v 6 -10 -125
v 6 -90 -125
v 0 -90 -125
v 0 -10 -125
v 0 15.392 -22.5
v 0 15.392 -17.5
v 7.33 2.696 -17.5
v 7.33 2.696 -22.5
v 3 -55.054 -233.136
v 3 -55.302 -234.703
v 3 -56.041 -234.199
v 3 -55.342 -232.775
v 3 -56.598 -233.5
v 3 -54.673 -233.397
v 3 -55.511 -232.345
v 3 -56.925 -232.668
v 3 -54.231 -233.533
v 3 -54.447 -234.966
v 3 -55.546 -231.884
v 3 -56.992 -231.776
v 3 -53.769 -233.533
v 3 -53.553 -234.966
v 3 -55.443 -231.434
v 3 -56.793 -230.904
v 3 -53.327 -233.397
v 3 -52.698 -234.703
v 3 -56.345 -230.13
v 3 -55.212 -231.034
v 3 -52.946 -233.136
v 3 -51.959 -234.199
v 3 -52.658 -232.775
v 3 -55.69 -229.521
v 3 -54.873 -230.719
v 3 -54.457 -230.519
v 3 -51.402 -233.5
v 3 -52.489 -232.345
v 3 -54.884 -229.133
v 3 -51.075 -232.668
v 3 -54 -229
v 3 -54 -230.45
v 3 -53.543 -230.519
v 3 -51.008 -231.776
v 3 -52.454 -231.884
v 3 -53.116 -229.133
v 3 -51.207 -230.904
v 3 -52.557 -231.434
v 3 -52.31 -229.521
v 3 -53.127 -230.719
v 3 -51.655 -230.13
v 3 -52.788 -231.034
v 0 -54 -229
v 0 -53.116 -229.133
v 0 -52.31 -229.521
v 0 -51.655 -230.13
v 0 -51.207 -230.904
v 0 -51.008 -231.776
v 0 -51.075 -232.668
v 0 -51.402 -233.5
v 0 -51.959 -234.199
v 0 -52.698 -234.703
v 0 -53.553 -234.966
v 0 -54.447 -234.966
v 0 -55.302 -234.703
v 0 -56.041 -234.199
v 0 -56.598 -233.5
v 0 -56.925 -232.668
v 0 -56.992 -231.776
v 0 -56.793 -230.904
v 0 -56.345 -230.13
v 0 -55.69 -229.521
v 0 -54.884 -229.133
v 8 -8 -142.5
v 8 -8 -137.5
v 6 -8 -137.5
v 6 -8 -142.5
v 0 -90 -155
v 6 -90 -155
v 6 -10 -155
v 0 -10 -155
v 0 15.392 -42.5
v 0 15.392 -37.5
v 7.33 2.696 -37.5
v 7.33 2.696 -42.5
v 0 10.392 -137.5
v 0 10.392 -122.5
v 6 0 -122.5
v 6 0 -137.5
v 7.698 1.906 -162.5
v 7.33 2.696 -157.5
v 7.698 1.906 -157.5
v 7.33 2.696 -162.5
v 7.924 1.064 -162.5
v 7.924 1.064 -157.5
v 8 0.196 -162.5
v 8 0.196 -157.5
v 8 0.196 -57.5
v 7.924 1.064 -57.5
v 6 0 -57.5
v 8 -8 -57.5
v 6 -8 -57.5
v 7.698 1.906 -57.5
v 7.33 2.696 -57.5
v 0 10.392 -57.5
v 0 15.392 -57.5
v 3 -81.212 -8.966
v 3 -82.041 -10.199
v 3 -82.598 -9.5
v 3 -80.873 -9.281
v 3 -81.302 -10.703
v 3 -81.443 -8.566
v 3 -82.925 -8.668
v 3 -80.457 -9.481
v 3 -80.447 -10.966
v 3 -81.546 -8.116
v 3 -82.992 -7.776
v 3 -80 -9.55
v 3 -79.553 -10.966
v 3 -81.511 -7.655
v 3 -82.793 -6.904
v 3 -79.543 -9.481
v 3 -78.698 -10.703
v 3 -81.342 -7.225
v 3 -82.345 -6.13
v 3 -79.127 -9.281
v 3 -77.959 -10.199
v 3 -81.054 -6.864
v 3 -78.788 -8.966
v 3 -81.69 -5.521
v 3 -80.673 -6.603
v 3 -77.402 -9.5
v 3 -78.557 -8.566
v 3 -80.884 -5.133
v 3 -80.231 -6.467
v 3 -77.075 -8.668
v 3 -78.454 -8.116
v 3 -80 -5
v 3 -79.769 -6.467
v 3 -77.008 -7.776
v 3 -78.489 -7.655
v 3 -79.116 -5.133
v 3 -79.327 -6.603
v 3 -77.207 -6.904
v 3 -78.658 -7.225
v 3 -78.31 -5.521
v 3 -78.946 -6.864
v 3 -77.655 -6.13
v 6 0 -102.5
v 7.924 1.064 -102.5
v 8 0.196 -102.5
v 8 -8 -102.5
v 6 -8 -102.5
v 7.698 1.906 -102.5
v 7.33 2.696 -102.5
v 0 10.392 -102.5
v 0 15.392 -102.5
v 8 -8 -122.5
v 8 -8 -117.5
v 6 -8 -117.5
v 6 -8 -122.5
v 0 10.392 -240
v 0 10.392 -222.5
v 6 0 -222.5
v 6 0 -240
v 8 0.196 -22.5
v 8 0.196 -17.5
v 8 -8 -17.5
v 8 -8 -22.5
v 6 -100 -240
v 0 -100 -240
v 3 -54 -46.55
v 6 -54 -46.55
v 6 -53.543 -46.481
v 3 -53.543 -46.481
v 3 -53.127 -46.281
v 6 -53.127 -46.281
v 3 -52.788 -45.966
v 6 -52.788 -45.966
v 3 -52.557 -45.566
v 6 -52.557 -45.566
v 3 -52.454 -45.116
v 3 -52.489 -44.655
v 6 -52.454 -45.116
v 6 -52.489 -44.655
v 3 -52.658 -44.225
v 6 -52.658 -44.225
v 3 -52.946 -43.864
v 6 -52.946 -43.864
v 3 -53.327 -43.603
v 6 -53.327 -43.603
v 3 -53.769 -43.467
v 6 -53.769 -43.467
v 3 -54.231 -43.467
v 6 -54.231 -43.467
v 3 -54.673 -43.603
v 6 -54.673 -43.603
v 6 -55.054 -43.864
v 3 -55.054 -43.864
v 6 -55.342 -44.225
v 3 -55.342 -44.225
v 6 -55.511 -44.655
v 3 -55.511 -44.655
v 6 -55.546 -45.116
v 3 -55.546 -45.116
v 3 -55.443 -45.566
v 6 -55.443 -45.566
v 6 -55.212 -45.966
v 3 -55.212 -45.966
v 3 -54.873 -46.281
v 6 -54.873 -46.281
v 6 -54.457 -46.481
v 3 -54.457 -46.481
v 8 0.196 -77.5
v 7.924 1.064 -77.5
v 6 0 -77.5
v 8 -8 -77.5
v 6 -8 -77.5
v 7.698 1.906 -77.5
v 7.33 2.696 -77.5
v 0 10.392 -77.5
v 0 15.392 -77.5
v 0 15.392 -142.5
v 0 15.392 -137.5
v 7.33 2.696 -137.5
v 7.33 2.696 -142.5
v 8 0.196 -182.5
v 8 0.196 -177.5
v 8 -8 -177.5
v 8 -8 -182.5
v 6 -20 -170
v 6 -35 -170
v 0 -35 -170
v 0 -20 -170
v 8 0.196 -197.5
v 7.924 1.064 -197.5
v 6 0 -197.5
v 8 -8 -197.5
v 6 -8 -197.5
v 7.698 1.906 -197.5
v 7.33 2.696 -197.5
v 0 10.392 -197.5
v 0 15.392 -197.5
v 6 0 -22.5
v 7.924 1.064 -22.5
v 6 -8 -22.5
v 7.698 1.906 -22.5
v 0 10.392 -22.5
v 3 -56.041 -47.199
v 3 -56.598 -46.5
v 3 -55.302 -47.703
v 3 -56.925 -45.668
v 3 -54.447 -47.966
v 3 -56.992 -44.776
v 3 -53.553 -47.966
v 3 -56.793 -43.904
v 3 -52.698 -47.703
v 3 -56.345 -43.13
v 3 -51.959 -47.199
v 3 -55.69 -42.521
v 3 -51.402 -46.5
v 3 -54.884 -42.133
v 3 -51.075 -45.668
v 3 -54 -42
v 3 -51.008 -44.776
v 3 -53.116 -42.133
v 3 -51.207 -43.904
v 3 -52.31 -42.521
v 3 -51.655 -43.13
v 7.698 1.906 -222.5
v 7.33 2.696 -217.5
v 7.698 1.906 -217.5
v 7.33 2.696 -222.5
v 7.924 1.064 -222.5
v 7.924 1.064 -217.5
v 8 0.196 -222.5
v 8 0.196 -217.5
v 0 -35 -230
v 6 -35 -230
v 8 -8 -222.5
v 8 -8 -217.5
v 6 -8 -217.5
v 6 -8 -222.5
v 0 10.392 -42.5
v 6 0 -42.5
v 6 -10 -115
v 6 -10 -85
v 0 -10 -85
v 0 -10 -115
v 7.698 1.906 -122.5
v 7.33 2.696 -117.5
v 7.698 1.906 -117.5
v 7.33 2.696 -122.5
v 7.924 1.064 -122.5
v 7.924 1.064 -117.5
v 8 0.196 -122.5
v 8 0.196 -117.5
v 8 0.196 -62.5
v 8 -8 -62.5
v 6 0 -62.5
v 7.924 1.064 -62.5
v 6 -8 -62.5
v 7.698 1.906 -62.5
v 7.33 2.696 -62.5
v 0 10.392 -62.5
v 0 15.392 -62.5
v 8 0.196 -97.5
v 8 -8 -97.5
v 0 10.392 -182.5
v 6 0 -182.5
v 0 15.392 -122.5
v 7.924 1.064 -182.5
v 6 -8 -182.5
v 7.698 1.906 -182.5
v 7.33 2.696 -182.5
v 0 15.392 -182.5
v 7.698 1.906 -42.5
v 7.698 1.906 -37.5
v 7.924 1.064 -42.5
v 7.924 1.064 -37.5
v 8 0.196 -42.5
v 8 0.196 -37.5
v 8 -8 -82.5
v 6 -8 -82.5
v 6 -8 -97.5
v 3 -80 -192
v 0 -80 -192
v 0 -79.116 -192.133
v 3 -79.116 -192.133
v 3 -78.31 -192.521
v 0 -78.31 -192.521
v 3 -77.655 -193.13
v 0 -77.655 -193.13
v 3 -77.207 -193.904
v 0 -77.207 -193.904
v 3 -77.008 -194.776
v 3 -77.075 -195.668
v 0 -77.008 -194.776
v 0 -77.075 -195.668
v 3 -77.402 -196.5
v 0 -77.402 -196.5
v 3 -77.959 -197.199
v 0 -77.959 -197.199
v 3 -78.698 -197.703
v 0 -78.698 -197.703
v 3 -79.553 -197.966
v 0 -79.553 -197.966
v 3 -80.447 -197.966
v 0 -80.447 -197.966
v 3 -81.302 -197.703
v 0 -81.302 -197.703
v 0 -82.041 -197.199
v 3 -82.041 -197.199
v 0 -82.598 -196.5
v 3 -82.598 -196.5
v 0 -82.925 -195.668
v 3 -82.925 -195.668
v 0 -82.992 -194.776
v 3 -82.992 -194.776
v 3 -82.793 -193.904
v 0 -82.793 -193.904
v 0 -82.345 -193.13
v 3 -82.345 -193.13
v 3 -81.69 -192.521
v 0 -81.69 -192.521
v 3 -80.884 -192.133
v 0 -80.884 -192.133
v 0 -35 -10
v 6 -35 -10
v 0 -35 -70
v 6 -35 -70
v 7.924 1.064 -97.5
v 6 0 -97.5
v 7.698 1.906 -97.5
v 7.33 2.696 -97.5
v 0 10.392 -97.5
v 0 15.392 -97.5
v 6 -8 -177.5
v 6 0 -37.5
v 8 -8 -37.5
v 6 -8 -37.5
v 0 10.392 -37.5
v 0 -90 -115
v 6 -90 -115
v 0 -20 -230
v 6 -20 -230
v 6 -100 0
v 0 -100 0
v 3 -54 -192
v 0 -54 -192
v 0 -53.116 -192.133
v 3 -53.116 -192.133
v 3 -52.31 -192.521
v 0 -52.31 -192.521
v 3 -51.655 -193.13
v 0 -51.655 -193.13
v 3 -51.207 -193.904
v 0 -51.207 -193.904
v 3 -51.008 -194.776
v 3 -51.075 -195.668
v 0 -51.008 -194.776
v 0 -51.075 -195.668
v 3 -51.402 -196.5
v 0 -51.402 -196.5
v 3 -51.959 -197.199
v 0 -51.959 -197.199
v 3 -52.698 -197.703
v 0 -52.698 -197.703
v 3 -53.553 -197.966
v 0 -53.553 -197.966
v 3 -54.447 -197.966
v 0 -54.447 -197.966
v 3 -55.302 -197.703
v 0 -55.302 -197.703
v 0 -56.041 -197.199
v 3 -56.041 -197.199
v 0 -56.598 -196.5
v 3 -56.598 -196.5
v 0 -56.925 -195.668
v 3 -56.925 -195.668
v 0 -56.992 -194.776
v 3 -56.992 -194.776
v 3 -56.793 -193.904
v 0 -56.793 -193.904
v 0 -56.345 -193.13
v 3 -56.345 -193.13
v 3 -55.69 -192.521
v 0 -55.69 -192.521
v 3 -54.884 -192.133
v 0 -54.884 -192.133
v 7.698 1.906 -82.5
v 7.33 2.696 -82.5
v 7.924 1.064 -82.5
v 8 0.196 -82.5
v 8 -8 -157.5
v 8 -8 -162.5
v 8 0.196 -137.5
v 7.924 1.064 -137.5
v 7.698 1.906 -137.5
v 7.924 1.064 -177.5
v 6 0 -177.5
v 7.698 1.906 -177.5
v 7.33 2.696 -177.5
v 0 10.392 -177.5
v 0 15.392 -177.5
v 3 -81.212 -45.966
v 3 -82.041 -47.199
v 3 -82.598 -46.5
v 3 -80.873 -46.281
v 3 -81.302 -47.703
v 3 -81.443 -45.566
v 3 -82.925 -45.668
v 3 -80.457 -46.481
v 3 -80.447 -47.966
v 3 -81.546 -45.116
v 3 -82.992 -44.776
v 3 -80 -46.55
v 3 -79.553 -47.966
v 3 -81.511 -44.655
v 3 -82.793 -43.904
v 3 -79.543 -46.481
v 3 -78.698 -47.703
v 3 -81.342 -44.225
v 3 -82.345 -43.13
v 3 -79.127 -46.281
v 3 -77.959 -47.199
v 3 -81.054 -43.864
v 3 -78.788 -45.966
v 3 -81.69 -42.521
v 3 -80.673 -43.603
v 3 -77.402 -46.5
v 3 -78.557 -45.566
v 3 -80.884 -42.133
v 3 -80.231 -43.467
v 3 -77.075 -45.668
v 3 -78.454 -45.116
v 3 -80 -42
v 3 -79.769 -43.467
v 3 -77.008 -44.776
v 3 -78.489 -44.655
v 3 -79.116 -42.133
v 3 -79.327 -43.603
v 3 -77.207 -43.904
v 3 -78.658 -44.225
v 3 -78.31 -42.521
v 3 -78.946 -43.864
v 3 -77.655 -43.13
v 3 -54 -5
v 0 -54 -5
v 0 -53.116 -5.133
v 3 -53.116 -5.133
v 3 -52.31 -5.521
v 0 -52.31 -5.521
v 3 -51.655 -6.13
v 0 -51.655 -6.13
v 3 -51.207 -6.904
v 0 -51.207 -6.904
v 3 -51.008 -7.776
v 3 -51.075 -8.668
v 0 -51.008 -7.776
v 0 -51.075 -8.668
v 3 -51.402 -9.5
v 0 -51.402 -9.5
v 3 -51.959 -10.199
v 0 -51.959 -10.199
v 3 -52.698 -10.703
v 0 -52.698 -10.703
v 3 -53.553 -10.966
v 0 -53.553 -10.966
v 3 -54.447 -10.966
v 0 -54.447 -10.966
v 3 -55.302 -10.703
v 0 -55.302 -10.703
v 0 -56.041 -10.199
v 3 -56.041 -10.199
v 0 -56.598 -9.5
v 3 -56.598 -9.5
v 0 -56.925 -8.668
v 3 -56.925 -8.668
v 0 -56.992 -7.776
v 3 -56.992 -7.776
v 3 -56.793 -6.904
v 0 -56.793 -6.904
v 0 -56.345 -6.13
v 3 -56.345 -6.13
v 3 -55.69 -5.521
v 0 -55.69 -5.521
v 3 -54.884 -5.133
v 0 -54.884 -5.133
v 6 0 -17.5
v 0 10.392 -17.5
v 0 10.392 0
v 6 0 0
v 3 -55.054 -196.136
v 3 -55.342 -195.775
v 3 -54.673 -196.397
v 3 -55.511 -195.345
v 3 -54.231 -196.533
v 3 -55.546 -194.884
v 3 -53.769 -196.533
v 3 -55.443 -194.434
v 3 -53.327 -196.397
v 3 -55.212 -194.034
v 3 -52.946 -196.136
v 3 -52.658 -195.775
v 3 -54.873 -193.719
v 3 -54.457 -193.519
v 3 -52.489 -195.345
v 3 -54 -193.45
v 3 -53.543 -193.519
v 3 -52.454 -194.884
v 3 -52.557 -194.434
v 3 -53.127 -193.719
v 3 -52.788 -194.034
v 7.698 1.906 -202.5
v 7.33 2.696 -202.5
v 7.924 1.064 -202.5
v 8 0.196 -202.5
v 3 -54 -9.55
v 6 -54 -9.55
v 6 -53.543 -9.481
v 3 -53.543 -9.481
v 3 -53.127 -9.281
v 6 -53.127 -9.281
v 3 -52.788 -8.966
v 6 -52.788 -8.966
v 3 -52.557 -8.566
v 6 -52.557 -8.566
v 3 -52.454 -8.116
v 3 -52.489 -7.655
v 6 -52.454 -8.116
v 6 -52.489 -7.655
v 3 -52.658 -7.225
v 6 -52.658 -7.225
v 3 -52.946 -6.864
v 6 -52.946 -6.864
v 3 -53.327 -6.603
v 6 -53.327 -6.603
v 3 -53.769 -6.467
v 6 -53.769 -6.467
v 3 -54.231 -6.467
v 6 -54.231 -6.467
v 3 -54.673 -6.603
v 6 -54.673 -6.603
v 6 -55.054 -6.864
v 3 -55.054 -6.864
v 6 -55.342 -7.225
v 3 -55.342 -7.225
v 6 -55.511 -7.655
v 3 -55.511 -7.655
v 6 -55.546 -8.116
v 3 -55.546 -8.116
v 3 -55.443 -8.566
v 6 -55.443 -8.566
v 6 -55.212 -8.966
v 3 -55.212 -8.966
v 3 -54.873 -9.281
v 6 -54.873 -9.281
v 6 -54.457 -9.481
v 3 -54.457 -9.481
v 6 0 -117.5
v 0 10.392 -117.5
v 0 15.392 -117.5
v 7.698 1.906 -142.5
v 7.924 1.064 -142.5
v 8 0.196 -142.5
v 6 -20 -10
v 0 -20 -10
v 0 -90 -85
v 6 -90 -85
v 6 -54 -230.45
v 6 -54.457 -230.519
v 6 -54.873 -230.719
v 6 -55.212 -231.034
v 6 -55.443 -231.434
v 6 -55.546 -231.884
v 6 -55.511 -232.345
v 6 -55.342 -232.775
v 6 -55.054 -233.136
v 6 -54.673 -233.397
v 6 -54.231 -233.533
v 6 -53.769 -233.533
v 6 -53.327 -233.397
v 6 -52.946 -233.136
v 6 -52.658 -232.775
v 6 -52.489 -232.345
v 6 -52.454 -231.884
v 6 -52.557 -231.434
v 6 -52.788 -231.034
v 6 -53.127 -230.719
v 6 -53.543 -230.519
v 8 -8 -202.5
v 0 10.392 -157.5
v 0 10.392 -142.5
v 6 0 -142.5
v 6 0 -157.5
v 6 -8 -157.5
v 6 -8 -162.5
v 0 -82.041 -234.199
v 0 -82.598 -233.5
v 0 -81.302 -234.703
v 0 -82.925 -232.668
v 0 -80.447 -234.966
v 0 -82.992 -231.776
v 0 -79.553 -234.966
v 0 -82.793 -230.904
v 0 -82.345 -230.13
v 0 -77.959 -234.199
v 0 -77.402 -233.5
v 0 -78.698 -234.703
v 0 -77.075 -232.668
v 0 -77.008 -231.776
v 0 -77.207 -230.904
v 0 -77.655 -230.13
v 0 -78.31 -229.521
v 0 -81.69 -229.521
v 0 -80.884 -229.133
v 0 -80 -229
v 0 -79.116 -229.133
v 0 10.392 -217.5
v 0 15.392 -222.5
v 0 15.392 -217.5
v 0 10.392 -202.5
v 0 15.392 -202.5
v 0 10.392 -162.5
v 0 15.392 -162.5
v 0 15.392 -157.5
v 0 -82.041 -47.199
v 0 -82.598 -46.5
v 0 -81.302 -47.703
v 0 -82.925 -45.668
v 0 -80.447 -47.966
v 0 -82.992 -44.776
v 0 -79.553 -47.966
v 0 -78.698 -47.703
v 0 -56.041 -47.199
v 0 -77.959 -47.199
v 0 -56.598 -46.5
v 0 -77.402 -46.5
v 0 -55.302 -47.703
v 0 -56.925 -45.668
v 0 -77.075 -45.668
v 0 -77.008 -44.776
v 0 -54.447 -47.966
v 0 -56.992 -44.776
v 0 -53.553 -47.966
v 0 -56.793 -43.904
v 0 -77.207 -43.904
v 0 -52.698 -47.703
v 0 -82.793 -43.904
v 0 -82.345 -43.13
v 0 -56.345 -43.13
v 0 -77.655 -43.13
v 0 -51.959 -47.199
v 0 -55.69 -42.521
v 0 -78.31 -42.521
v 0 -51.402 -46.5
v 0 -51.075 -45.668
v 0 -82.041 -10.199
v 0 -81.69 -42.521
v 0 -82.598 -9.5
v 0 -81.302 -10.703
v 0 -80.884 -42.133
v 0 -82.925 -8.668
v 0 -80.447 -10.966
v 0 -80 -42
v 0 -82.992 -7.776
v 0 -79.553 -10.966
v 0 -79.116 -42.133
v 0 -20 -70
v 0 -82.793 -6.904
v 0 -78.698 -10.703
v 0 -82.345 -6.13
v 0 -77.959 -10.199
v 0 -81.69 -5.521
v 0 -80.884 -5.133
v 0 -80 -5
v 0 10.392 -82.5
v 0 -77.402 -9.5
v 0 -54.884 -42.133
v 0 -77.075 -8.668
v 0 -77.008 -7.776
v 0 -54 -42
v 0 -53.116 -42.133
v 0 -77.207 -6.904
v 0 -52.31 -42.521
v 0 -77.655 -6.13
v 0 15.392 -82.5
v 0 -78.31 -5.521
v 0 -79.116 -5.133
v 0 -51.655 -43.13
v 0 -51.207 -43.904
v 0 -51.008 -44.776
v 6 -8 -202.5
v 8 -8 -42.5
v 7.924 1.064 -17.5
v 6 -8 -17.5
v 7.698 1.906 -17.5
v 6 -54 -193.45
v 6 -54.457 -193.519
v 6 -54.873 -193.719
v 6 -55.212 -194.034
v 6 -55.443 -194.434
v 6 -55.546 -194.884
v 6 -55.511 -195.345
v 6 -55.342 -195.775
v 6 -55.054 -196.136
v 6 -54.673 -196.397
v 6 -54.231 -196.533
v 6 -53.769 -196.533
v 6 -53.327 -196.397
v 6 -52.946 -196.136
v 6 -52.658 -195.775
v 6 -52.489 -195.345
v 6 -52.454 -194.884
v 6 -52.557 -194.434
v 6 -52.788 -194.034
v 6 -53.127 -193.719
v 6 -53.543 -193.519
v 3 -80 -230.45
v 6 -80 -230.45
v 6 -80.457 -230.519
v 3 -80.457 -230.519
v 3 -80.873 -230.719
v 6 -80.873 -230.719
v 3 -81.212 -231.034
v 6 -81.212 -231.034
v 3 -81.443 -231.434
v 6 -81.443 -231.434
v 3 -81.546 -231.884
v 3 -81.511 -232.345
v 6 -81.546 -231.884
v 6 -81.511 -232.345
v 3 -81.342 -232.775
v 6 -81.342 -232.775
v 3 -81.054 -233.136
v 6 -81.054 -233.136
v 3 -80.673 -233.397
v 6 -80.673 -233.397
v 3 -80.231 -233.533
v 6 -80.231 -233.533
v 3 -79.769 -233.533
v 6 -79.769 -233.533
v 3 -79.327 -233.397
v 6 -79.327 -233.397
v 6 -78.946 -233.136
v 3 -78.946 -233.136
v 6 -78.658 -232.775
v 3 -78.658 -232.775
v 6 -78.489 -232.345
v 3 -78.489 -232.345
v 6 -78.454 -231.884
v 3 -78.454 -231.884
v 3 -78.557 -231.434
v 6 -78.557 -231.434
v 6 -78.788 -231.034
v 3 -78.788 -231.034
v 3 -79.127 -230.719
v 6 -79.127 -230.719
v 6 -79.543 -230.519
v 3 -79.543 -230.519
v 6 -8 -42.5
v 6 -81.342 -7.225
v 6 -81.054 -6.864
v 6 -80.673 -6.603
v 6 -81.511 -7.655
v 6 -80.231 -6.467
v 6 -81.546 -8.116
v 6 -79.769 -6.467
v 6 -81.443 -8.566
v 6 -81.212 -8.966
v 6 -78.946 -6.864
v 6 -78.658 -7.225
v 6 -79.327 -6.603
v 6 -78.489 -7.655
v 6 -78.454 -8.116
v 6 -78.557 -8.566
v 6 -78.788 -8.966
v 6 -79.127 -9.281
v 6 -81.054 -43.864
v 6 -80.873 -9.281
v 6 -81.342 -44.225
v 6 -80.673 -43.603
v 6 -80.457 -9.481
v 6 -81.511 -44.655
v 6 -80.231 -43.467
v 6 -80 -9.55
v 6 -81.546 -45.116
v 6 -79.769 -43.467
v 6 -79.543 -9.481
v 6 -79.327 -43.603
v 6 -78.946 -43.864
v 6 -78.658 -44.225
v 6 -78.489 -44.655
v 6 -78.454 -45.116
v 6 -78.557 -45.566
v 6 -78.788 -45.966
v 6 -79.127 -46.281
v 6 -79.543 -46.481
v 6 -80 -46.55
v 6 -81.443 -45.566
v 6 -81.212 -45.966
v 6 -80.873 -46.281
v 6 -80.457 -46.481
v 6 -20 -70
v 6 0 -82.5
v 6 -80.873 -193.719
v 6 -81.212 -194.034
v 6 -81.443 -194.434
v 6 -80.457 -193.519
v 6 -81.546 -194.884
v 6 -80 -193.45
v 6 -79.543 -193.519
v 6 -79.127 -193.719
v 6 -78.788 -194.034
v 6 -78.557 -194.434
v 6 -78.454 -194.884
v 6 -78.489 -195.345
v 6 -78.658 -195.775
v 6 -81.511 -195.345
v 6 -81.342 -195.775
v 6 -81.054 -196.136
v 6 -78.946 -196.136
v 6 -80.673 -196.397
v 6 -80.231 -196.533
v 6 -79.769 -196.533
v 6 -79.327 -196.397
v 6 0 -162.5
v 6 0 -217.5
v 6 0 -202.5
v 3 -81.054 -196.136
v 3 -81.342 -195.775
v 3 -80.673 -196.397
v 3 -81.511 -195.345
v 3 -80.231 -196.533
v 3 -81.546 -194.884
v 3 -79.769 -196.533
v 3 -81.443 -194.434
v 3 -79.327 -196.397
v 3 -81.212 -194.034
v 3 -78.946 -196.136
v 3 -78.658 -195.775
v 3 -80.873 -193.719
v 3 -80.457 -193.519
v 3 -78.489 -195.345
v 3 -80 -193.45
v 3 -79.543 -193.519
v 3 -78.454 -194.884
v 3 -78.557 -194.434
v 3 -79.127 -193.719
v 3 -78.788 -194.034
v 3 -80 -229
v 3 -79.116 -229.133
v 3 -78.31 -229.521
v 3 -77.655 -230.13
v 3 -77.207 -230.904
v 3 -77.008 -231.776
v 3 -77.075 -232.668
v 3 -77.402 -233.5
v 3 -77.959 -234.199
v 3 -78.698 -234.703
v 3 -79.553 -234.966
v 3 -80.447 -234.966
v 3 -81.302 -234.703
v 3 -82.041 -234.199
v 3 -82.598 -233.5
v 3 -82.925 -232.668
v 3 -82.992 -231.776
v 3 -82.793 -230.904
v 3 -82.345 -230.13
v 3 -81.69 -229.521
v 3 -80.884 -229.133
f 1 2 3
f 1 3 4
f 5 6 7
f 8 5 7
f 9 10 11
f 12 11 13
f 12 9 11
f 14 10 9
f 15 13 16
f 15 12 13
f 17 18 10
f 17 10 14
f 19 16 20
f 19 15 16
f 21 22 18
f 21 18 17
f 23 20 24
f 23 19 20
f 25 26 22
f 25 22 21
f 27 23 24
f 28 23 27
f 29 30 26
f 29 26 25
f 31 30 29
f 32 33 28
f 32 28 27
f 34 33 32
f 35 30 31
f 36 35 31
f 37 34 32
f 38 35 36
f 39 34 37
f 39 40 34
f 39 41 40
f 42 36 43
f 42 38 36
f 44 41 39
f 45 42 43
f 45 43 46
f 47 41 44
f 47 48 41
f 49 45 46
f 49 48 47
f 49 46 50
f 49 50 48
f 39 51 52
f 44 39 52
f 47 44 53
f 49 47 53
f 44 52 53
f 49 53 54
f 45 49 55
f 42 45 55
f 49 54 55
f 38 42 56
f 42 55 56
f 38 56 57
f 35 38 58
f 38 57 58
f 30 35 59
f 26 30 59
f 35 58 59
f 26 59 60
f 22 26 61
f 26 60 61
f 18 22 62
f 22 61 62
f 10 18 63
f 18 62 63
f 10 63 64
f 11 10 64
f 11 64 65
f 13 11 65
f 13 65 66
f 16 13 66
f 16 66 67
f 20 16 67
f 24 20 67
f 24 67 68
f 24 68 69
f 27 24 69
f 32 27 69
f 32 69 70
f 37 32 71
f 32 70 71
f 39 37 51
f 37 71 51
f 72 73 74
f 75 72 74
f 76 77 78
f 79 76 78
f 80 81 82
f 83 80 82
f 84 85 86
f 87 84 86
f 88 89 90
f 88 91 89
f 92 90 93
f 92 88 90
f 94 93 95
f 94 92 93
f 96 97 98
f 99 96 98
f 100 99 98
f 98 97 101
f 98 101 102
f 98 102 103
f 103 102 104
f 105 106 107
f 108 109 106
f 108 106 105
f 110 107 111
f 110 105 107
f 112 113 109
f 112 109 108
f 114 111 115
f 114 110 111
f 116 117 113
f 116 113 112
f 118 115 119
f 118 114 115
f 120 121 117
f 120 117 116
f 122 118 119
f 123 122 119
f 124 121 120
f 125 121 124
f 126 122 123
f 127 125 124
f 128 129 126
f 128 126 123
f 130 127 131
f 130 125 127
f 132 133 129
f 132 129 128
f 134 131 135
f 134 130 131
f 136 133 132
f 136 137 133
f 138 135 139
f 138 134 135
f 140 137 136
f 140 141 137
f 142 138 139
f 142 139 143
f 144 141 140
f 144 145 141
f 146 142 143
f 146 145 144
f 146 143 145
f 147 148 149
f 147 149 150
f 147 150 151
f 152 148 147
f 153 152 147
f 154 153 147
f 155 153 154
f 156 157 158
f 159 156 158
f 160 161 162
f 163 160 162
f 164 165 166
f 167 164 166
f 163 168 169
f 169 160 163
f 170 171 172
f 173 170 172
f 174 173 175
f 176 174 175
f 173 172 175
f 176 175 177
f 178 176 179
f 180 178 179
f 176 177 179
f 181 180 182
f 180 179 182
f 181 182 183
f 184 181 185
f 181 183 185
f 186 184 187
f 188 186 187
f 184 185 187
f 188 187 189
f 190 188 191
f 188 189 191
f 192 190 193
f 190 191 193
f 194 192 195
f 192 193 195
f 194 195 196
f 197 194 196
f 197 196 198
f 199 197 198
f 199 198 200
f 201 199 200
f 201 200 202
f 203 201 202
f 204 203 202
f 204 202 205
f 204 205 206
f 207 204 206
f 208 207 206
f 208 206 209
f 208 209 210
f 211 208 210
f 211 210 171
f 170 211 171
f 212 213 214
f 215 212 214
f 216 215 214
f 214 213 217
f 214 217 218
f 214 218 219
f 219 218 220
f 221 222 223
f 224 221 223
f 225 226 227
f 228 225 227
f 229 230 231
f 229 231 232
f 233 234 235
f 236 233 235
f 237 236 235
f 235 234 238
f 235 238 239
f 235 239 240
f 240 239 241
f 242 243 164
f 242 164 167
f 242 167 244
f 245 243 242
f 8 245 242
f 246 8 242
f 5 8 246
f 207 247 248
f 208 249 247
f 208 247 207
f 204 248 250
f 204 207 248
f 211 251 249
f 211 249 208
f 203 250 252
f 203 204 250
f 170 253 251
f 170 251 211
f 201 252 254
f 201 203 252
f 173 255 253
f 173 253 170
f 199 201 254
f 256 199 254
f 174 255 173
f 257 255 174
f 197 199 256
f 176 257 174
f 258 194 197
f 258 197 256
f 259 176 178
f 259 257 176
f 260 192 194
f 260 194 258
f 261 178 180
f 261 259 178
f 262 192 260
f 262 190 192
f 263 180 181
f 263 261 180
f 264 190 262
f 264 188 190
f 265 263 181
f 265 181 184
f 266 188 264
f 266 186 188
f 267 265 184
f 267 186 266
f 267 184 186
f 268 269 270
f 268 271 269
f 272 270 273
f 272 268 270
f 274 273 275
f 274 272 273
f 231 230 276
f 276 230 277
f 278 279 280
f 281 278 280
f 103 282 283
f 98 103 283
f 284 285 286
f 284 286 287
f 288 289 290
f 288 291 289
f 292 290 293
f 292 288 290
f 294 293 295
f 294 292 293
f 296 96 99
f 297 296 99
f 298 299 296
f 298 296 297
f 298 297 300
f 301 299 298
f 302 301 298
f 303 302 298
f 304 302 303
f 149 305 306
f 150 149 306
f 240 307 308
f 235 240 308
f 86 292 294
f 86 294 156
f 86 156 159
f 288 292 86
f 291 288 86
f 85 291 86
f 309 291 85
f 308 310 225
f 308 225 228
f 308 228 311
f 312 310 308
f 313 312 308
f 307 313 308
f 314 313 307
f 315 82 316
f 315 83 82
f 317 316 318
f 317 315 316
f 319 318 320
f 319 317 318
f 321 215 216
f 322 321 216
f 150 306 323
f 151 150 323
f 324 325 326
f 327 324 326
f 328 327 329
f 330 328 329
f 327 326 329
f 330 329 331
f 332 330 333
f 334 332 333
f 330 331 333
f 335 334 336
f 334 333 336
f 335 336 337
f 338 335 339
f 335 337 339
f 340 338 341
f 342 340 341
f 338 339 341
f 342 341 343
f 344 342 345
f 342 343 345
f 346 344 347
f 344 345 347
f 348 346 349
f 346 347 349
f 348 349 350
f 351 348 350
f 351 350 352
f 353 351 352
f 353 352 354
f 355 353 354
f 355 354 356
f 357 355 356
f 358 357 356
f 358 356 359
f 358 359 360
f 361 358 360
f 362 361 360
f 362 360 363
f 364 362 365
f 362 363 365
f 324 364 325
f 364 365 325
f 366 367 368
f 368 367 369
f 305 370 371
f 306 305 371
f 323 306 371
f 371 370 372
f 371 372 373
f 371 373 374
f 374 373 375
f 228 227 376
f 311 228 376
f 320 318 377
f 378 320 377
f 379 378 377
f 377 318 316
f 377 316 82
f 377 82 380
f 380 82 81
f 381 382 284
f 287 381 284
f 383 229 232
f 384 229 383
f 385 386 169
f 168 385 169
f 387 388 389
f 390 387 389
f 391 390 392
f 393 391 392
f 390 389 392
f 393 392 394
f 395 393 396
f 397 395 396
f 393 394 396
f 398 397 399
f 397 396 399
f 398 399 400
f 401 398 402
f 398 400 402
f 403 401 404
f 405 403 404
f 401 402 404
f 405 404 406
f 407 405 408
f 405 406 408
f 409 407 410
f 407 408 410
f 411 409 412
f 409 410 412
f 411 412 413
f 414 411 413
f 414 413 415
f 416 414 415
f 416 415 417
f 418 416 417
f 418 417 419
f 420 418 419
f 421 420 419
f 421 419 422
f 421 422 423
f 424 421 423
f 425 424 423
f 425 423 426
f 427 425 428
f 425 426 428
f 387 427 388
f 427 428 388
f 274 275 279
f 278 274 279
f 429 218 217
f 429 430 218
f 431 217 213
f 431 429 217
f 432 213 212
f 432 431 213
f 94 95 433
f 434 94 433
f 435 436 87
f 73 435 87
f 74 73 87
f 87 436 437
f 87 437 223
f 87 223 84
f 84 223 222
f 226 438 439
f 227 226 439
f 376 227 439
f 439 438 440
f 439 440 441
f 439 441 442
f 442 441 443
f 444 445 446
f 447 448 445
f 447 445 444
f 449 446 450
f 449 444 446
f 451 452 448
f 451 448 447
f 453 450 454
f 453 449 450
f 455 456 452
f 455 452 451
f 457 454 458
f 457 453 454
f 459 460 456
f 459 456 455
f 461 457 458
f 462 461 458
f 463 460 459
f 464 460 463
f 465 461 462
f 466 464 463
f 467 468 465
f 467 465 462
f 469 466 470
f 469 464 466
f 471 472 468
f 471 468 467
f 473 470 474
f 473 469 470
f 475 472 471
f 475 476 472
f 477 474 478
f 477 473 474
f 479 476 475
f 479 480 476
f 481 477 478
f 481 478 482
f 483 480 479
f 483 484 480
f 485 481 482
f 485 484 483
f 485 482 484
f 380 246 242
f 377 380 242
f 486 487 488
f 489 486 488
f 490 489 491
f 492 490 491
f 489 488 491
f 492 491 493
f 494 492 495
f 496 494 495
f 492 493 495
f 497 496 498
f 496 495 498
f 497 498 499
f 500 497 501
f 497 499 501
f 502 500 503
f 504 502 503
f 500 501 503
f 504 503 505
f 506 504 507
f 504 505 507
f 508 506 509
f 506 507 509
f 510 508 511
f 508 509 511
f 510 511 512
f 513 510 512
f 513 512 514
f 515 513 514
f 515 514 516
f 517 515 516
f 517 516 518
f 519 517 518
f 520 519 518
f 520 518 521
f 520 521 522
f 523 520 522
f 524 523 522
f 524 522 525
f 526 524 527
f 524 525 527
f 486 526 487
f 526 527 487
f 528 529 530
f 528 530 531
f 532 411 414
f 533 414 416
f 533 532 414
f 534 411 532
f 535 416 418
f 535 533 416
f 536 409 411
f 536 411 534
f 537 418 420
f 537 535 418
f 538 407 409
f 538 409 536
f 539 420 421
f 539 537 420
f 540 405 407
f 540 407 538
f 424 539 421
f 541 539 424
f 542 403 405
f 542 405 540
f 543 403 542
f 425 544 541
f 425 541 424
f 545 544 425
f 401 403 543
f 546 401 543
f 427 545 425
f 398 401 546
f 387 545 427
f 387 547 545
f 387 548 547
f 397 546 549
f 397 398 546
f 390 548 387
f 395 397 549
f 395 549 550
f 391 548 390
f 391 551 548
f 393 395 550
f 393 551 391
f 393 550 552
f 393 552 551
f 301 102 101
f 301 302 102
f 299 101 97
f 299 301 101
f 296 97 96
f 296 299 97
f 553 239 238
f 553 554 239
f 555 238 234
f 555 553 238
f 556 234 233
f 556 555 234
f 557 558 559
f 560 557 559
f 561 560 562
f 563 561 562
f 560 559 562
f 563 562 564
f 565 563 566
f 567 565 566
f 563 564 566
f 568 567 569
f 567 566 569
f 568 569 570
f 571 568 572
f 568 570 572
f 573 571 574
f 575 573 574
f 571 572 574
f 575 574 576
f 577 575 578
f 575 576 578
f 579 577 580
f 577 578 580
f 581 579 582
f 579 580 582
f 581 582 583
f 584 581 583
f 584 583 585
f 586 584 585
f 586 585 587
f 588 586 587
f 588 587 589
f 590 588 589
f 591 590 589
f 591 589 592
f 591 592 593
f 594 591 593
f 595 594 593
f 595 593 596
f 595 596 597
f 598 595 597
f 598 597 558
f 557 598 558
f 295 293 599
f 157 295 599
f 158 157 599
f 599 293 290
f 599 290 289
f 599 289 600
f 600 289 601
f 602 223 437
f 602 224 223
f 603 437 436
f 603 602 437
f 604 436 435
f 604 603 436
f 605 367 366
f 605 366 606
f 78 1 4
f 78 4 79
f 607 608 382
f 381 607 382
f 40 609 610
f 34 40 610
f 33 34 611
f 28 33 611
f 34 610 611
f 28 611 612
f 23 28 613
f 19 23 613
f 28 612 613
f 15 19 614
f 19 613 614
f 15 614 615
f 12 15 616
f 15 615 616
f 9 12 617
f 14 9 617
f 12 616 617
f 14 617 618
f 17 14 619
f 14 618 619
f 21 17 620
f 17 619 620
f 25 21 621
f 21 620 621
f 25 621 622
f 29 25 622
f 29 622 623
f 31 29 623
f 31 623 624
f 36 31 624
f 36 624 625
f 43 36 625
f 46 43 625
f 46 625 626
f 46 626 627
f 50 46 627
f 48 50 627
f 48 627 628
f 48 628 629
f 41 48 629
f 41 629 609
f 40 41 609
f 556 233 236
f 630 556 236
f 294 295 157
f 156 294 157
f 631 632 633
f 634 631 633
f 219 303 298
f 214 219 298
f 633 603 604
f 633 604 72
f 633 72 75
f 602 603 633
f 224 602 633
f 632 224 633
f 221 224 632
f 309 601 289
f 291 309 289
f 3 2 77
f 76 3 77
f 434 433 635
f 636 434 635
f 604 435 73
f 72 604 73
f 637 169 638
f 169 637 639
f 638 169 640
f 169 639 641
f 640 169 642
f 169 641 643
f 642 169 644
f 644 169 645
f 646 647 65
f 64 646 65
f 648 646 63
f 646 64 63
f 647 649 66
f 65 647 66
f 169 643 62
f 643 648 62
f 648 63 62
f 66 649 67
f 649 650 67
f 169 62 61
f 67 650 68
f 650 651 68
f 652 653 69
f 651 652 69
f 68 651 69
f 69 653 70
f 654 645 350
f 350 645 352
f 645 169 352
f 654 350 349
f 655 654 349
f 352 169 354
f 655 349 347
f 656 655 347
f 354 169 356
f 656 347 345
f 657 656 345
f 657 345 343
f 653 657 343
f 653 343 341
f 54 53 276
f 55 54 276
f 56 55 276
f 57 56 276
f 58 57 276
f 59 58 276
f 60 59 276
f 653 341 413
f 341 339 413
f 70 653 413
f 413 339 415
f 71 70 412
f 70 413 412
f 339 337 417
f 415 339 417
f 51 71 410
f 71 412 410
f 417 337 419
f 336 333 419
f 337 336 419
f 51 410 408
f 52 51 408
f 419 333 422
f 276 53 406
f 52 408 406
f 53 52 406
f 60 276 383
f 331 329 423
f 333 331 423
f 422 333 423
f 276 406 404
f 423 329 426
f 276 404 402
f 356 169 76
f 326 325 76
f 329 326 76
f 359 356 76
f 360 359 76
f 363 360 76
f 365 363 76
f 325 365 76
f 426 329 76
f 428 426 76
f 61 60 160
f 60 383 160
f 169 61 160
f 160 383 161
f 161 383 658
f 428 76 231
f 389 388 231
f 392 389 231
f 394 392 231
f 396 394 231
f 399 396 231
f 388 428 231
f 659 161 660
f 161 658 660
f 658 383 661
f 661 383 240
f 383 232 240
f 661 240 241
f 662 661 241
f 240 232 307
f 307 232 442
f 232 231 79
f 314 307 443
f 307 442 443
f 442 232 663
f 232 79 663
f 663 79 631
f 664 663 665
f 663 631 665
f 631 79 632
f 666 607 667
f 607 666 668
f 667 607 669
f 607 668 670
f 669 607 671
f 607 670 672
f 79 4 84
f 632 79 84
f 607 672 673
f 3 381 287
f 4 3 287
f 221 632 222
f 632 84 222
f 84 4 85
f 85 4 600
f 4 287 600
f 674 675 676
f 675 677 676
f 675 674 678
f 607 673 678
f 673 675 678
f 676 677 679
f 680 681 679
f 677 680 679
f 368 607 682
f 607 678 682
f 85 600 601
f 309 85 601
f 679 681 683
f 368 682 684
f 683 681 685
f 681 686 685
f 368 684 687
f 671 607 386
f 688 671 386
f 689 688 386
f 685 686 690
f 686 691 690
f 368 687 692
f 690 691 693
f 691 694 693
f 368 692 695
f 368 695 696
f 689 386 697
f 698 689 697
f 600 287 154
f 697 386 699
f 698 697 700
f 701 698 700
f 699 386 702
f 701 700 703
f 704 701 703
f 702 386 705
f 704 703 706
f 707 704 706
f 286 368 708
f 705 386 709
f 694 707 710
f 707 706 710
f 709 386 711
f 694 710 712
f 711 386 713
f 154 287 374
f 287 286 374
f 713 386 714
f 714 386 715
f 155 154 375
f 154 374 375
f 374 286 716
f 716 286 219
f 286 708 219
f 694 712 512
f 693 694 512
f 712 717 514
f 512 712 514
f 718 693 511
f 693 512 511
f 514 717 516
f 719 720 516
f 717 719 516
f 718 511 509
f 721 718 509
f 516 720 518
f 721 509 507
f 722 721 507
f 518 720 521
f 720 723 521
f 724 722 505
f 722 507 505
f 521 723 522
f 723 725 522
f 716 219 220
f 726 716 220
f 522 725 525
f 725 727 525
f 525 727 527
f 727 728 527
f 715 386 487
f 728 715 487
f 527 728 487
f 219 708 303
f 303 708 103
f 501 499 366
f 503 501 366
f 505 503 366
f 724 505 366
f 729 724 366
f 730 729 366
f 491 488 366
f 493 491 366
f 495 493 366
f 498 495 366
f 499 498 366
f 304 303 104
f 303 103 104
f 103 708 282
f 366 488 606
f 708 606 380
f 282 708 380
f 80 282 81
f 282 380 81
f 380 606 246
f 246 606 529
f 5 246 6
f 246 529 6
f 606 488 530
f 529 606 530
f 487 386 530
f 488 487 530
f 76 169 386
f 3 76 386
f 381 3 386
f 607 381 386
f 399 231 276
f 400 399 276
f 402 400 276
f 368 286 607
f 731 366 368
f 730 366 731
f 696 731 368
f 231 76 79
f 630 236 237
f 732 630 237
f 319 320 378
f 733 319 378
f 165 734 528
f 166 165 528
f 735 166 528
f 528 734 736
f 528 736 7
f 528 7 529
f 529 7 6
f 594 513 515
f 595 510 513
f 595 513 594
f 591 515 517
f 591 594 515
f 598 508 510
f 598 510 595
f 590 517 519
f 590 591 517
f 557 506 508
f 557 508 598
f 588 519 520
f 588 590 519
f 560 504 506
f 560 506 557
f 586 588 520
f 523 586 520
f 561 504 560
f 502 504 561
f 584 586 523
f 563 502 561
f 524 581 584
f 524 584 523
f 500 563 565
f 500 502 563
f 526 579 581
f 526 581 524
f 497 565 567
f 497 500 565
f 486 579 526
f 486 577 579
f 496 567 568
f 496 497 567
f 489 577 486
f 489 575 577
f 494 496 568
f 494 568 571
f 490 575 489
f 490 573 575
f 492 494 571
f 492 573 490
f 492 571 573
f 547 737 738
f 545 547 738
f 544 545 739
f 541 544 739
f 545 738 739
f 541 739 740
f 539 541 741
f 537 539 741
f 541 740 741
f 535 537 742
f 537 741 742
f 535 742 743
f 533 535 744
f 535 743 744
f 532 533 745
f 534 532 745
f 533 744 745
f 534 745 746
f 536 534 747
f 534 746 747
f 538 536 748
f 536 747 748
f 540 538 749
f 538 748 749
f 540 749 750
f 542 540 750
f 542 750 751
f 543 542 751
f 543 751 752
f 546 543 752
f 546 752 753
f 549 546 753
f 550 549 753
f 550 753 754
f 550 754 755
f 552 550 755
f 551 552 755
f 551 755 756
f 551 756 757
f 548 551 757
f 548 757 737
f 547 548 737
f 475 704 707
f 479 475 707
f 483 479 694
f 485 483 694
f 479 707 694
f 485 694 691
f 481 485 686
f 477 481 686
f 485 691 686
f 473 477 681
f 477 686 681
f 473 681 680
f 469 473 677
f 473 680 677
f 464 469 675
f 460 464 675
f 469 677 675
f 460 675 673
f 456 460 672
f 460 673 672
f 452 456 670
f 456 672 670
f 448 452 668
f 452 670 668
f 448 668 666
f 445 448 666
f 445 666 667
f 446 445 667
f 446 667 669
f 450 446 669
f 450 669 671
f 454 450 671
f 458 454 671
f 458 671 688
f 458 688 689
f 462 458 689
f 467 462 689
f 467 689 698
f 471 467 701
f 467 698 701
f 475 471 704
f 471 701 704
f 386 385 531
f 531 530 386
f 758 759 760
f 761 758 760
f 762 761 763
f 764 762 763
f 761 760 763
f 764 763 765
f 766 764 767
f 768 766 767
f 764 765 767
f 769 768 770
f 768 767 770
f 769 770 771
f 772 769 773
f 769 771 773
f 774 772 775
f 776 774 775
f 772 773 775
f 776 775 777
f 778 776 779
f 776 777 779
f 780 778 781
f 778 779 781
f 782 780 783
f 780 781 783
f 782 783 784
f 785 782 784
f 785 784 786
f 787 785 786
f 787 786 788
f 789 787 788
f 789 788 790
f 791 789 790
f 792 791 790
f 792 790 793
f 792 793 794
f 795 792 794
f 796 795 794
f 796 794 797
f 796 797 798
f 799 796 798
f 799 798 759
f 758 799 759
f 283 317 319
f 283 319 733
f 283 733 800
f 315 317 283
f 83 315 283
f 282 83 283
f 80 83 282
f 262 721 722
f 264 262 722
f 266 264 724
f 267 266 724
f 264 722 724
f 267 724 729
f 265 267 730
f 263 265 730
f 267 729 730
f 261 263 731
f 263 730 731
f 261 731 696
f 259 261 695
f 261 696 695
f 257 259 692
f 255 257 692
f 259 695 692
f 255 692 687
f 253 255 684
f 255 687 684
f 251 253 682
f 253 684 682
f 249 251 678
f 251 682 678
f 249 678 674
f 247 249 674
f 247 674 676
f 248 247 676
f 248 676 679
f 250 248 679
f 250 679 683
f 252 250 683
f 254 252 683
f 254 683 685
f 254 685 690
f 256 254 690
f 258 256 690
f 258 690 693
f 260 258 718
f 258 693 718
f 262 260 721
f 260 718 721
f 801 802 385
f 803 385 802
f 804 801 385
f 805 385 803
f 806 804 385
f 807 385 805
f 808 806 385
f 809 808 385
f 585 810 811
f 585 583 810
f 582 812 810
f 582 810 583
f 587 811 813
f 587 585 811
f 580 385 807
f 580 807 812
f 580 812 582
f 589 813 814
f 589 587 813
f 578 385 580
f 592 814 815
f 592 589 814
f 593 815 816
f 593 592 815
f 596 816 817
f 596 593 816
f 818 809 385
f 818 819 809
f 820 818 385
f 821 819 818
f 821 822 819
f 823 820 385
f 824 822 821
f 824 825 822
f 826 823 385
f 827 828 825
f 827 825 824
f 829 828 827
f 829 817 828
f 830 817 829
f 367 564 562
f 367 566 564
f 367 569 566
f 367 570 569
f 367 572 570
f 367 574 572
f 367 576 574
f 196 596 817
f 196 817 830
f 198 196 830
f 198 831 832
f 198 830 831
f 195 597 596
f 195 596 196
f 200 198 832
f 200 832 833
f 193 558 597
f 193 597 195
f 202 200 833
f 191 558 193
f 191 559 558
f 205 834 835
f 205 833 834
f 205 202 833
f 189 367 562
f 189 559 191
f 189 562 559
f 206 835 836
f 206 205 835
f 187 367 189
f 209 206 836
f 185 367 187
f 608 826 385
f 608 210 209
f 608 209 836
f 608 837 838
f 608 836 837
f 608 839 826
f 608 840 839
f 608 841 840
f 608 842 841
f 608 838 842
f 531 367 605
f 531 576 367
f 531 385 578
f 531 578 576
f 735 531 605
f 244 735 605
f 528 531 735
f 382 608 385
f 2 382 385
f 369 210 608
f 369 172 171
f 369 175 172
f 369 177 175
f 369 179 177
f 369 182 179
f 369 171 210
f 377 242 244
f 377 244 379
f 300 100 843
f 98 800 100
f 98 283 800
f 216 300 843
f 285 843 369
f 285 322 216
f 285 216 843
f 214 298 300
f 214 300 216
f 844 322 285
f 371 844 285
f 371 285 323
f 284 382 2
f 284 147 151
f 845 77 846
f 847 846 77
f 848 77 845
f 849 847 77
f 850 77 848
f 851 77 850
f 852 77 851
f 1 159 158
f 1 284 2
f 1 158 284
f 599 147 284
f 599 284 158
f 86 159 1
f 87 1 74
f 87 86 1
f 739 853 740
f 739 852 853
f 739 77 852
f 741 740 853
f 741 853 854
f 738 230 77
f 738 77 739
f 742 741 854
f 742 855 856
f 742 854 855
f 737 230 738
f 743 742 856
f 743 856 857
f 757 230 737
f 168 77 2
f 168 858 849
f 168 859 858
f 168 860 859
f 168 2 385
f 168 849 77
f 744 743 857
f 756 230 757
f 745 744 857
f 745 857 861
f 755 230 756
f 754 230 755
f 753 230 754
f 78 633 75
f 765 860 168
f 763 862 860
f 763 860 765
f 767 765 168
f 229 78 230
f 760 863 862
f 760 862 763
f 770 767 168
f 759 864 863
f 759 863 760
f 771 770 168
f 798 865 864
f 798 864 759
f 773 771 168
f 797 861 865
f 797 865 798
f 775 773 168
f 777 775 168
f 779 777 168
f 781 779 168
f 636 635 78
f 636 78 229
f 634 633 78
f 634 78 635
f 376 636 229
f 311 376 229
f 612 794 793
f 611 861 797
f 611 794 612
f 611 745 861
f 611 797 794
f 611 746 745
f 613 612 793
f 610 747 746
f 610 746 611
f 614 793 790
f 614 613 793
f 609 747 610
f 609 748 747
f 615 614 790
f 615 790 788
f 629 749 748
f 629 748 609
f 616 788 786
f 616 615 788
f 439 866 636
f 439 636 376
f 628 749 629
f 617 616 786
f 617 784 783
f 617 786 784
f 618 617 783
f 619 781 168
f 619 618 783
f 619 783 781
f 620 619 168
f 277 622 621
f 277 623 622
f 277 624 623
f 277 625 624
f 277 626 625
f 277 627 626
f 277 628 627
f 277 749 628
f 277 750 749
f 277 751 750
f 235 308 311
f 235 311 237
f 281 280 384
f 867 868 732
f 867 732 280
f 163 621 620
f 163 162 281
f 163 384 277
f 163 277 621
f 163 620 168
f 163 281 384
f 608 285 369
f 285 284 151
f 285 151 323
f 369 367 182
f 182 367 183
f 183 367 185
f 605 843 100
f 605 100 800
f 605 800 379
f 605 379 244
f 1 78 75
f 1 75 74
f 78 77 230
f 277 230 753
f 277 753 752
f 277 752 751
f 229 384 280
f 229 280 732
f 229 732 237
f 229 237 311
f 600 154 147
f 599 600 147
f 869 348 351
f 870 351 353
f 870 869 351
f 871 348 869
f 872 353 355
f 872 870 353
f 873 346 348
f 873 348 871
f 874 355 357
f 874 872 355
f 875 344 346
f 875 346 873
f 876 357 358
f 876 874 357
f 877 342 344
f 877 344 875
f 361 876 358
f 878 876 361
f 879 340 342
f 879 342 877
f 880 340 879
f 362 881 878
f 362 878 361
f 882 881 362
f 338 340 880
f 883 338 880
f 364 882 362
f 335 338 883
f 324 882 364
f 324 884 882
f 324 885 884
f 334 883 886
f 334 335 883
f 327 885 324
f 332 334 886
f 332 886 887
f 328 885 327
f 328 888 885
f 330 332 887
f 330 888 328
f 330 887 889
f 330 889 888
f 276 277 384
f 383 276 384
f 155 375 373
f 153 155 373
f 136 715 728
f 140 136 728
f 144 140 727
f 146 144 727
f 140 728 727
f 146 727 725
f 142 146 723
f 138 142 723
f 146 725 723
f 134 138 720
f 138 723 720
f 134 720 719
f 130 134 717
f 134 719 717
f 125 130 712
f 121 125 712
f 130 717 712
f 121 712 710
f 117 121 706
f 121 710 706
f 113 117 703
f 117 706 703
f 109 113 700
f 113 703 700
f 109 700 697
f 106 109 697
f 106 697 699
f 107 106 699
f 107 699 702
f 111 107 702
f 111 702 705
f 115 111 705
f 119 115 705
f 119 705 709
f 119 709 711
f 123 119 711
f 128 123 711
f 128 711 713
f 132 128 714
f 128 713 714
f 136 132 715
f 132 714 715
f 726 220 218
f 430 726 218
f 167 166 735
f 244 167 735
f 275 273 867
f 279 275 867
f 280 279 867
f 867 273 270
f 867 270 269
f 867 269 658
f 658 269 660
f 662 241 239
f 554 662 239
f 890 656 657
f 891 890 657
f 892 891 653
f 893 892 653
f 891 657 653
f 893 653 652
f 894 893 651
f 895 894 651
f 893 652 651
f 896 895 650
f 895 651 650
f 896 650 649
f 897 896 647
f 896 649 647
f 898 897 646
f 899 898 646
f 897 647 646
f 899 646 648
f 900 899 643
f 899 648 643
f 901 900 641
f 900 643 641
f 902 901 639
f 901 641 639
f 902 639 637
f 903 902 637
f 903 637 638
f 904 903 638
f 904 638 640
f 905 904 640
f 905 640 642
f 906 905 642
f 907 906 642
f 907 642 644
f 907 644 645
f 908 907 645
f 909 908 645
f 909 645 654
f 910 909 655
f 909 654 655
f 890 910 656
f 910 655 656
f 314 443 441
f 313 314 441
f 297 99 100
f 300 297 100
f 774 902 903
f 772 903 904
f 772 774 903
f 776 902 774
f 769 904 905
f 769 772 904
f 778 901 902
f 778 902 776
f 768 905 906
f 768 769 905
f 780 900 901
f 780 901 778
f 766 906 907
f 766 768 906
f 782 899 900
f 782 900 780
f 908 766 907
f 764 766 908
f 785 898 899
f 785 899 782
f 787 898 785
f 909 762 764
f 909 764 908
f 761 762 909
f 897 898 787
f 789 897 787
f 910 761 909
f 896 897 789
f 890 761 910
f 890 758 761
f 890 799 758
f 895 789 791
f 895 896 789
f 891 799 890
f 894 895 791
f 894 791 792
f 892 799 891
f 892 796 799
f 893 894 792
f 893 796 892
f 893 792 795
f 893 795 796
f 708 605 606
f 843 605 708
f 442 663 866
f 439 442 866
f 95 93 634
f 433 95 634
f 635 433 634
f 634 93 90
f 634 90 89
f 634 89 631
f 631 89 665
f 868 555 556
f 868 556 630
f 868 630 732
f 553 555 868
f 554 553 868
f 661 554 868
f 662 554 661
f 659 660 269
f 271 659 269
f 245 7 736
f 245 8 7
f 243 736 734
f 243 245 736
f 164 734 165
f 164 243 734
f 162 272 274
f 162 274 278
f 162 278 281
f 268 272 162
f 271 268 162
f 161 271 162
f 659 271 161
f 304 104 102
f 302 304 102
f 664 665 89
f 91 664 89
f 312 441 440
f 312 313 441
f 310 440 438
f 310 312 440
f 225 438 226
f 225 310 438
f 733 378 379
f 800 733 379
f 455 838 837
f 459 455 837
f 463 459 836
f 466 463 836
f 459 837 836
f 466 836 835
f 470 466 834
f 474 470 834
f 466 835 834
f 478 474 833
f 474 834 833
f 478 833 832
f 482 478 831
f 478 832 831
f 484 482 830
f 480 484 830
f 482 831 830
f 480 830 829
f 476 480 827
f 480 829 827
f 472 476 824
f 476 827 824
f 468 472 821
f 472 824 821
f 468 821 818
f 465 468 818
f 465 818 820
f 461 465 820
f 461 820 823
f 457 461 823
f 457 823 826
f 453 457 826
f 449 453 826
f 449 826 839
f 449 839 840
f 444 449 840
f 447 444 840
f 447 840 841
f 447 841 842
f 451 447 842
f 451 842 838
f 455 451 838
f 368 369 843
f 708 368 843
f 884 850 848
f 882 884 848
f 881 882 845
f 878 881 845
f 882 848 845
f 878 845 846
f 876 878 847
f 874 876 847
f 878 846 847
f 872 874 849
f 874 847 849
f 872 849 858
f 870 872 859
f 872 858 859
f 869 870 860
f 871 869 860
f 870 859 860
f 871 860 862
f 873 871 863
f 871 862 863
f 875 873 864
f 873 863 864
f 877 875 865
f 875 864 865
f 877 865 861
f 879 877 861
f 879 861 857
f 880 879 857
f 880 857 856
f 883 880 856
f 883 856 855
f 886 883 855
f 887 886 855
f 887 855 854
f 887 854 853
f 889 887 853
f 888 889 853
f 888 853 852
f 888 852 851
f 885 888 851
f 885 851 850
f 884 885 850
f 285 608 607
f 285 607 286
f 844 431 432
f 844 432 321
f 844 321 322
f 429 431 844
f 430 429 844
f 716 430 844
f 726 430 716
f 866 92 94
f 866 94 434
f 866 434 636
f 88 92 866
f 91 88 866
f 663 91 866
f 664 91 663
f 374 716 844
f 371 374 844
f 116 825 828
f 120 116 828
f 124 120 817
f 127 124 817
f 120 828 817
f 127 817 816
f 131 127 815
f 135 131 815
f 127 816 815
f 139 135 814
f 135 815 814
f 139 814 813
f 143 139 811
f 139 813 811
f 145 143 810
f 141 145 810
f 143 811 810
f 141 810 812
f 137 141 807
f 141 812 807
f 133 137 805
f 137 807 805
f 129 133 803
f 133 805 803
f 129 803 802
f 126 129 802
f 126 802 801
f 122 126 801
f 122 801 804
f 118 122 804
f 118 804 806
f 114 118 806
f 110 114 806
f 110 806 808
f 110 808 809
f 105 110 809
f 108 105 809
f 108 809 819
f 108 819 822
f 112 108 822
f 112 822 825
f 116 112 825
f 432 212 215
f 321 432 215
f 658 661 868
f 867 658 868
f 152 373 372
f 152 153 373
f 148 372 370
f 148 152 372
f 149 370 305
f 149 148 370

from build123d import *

# Parameters (mm, degrees)
SKETCH_1_W                 = 240
SKETCH_1_H                 = 100
EXTRUDE_1_DEPTH            = 6
SKETCH_2_R                 = 1.55
CUT_EXTRUDE_1_DEPTH        = 261.069221555
SKETCH_3_W                 = 60
SKETCH_3_H                 = 15
CUT_EXTRUDE_2_DEPTH        = 261.069221555
SKETCH_4_W                 = 30
SKETCH_4_H                 = 80
CUT_EXTRUDE_3_DEPTH        = 261.069221555
SKETCH_5_R                 = 3
CUT_EXTRUDE_4_DEPTH        = 3
EXTRUDE_2_DEPTH            = 240
EXTRUDE_3_DEPTH            = 5
PATTERN_LINEAR_5_COUNT     = 6
PATTERN_LINEAR_5_PITCH     = 20
PATTERN_LINEAR_5_COL_COUNT = 6
PATTERN_LINEAR_5_COL_PITCH = 20
FILLET_5_R                 = 5


with BuildPart() as part:
    # 草图1 → 凸台-拉伸1 (new body)
    with BuildSketch(Plane(origin=(0, 0, 0), x_dir=(0, 0, -1), z_dir=(1, 0, 0))):
        with Locations((120, -50)):
            Rectangle(SKETCH_1_W, SKETCH_1_H)
    extrude(amount=EXTRUDE_1_DEPTH)

    # 草图2 → 切除-拉伸1 (cut, through all)
    with BuildSketch(Plane(origin=(6, 0, 0), x_dir=(0, 0, -1), z_dir=(1, 0, 0))):
        with Locations((8, -54)):
            Circle(SKETCH_2_R)
        with Locations((45, -80)):
            Circle(SKETCH_2_R)
        with Locations((45, -54)):
            Circle(SKETCH_2_R)
        with Locations((8, -80)):
            Circle(SKETCH_2_R)
        with Locations(Location((232, -80, 0), (0, 0, 180))):
            Circle(SKETCH_2_R)
        with Locations(Location((195, -54, 0), (0, 0, 180))):
            Circle(SKETCH_2_R)
        with Locations(Location((195, -80, 0), (0, 0, 180))):
            Circle(SKETCH_2_R)
        with Locations(Location((232, -54, 0), (0, 0, 180))):
            Circle(SKETCH_2_R)
    extrude(amount=-CUT_EXTRUDE_1_DEPTH, mode=Mode.SUBTRACT)

    # 草图3 → 切除-拉伸2 (cut, through all)
    with BuildSketch(Plane(origin=(6, 0, 0), x_dir=(0, 0, -1), z_dir=(1, 0, 0))):
        with Locations((40, -27.5)):
            Rectangle(SKETCH_3_W, SKETCH_3_H)
        with Locations((200, -27.5)):
            Rectangle(SKETCH_3_W, SKETCH_3_H)
    extrude(amount=-CUT_EXTRUDE_2_DEPTH, mode=Mode.SUBTRACT)

    # 草图4 → 切除-拉伸3 (cut, through all)
    with BuildSketch(Plane(origin=(6, 0, 0), x_dir=(0, 0, -1), z_dir=(1, 0, 0))):
        with Locations((100, -50)):
            Rectangle(SKETCH_4_W, SKETCH_4_H)
        with Locations((140, -50)):
            Rectangle(SKETCH_4_W, SKETCH_4_H)
    extrude(amount=-CUT_EXTRUDE_3_DEPTH, mode=Mode.SUBTRACT)

    # 草图5 → 切除-拉伸4 (cut)
    with BuildSketch(Plane.ZY):
        with Locations((-195, -80)):
            Circle(SKETCH_5_R)
        with Locations((-232, -80)):
            Circle(SKETCH_5_R)
        with Locations((-195, -54)):
            Circle(SKETCH_5_R)
        with Locations((-232, -54)):
            Circle(SKETCH_5_R)
        with Locations((-45, -80)):
            Circle(SKETCH_5_R)
        with Locations((-8, -80)):
            Circle(SKETCH_5_R)
        with Locations((-8, -54)):
            Circle(SKETCH_5_R)
        with Locations((-45, -54)):
            Circle(SKETCH_5_R)
    extrude(amount=-CUT_EXTRUDE_4_DEPTH, mode=Mode.SUBTRACT)

    # 草图6 → 凸台-拉伸2 (add)
    with BuildSketch(Plane.XY):
        Polygon((6, 0), (0, 0), (0, 10.392304845), align=None)
    extrude(amount=-EXTRUDE_2_DEPTH)

    # 草图7 → 凸台-拉伸3 (add)
    with BuildSketch(Plane.XY.offset(-117.5)):
        Polygon((0, 10.392304845), (0, 15.392304845), (8, 1.535898385), (8, -8), (6, -8), (6, 0), align=None)
    extrude_3 = extrude(amount=-EXTRUDE_3_DEPTH)

    # 阵列(线性)5: 凸台-拉伸3 ×6
    with Locations(*[(0, 0, i * PATTERN_LINEAR_5_PITCH) for i in range(1, PATTERN_LINEAR_5_COUNT)]):
        add(extrude_3)

    # 阵列(线性)5 col: 凸台-拉伸3 ×6
    with Locations(*[(0, 0, -i * PATTERN_LINEAR_5_COL_PITCH) for i in range(1, PATTERN_LINEAR_5_COL_COUNT)]):
        add(extrude_3)

    # 圆角5
    fillet_5_edges = [part.edges().sort_by_distance(p)[0] for p in [
        (8, 1.535898385, -120),
        (8, 1.535898385, -140),
        (8, 1.535898385, -160),
        (8, 1.535898385, -180),
        (8, 1.535898385, -200),
        (8, 1.535898385, -220),
        (8, 1.535898385, -100),
        (8, 1.535898385, -80),
        (8, 1.535898385, -60),
        (8, 1.535898385, -40),
        (8, 1.535898385, -20),
    ]]
    fillet(fillet_5_edges, radius=FILLET_5_R)


solid = part.part
